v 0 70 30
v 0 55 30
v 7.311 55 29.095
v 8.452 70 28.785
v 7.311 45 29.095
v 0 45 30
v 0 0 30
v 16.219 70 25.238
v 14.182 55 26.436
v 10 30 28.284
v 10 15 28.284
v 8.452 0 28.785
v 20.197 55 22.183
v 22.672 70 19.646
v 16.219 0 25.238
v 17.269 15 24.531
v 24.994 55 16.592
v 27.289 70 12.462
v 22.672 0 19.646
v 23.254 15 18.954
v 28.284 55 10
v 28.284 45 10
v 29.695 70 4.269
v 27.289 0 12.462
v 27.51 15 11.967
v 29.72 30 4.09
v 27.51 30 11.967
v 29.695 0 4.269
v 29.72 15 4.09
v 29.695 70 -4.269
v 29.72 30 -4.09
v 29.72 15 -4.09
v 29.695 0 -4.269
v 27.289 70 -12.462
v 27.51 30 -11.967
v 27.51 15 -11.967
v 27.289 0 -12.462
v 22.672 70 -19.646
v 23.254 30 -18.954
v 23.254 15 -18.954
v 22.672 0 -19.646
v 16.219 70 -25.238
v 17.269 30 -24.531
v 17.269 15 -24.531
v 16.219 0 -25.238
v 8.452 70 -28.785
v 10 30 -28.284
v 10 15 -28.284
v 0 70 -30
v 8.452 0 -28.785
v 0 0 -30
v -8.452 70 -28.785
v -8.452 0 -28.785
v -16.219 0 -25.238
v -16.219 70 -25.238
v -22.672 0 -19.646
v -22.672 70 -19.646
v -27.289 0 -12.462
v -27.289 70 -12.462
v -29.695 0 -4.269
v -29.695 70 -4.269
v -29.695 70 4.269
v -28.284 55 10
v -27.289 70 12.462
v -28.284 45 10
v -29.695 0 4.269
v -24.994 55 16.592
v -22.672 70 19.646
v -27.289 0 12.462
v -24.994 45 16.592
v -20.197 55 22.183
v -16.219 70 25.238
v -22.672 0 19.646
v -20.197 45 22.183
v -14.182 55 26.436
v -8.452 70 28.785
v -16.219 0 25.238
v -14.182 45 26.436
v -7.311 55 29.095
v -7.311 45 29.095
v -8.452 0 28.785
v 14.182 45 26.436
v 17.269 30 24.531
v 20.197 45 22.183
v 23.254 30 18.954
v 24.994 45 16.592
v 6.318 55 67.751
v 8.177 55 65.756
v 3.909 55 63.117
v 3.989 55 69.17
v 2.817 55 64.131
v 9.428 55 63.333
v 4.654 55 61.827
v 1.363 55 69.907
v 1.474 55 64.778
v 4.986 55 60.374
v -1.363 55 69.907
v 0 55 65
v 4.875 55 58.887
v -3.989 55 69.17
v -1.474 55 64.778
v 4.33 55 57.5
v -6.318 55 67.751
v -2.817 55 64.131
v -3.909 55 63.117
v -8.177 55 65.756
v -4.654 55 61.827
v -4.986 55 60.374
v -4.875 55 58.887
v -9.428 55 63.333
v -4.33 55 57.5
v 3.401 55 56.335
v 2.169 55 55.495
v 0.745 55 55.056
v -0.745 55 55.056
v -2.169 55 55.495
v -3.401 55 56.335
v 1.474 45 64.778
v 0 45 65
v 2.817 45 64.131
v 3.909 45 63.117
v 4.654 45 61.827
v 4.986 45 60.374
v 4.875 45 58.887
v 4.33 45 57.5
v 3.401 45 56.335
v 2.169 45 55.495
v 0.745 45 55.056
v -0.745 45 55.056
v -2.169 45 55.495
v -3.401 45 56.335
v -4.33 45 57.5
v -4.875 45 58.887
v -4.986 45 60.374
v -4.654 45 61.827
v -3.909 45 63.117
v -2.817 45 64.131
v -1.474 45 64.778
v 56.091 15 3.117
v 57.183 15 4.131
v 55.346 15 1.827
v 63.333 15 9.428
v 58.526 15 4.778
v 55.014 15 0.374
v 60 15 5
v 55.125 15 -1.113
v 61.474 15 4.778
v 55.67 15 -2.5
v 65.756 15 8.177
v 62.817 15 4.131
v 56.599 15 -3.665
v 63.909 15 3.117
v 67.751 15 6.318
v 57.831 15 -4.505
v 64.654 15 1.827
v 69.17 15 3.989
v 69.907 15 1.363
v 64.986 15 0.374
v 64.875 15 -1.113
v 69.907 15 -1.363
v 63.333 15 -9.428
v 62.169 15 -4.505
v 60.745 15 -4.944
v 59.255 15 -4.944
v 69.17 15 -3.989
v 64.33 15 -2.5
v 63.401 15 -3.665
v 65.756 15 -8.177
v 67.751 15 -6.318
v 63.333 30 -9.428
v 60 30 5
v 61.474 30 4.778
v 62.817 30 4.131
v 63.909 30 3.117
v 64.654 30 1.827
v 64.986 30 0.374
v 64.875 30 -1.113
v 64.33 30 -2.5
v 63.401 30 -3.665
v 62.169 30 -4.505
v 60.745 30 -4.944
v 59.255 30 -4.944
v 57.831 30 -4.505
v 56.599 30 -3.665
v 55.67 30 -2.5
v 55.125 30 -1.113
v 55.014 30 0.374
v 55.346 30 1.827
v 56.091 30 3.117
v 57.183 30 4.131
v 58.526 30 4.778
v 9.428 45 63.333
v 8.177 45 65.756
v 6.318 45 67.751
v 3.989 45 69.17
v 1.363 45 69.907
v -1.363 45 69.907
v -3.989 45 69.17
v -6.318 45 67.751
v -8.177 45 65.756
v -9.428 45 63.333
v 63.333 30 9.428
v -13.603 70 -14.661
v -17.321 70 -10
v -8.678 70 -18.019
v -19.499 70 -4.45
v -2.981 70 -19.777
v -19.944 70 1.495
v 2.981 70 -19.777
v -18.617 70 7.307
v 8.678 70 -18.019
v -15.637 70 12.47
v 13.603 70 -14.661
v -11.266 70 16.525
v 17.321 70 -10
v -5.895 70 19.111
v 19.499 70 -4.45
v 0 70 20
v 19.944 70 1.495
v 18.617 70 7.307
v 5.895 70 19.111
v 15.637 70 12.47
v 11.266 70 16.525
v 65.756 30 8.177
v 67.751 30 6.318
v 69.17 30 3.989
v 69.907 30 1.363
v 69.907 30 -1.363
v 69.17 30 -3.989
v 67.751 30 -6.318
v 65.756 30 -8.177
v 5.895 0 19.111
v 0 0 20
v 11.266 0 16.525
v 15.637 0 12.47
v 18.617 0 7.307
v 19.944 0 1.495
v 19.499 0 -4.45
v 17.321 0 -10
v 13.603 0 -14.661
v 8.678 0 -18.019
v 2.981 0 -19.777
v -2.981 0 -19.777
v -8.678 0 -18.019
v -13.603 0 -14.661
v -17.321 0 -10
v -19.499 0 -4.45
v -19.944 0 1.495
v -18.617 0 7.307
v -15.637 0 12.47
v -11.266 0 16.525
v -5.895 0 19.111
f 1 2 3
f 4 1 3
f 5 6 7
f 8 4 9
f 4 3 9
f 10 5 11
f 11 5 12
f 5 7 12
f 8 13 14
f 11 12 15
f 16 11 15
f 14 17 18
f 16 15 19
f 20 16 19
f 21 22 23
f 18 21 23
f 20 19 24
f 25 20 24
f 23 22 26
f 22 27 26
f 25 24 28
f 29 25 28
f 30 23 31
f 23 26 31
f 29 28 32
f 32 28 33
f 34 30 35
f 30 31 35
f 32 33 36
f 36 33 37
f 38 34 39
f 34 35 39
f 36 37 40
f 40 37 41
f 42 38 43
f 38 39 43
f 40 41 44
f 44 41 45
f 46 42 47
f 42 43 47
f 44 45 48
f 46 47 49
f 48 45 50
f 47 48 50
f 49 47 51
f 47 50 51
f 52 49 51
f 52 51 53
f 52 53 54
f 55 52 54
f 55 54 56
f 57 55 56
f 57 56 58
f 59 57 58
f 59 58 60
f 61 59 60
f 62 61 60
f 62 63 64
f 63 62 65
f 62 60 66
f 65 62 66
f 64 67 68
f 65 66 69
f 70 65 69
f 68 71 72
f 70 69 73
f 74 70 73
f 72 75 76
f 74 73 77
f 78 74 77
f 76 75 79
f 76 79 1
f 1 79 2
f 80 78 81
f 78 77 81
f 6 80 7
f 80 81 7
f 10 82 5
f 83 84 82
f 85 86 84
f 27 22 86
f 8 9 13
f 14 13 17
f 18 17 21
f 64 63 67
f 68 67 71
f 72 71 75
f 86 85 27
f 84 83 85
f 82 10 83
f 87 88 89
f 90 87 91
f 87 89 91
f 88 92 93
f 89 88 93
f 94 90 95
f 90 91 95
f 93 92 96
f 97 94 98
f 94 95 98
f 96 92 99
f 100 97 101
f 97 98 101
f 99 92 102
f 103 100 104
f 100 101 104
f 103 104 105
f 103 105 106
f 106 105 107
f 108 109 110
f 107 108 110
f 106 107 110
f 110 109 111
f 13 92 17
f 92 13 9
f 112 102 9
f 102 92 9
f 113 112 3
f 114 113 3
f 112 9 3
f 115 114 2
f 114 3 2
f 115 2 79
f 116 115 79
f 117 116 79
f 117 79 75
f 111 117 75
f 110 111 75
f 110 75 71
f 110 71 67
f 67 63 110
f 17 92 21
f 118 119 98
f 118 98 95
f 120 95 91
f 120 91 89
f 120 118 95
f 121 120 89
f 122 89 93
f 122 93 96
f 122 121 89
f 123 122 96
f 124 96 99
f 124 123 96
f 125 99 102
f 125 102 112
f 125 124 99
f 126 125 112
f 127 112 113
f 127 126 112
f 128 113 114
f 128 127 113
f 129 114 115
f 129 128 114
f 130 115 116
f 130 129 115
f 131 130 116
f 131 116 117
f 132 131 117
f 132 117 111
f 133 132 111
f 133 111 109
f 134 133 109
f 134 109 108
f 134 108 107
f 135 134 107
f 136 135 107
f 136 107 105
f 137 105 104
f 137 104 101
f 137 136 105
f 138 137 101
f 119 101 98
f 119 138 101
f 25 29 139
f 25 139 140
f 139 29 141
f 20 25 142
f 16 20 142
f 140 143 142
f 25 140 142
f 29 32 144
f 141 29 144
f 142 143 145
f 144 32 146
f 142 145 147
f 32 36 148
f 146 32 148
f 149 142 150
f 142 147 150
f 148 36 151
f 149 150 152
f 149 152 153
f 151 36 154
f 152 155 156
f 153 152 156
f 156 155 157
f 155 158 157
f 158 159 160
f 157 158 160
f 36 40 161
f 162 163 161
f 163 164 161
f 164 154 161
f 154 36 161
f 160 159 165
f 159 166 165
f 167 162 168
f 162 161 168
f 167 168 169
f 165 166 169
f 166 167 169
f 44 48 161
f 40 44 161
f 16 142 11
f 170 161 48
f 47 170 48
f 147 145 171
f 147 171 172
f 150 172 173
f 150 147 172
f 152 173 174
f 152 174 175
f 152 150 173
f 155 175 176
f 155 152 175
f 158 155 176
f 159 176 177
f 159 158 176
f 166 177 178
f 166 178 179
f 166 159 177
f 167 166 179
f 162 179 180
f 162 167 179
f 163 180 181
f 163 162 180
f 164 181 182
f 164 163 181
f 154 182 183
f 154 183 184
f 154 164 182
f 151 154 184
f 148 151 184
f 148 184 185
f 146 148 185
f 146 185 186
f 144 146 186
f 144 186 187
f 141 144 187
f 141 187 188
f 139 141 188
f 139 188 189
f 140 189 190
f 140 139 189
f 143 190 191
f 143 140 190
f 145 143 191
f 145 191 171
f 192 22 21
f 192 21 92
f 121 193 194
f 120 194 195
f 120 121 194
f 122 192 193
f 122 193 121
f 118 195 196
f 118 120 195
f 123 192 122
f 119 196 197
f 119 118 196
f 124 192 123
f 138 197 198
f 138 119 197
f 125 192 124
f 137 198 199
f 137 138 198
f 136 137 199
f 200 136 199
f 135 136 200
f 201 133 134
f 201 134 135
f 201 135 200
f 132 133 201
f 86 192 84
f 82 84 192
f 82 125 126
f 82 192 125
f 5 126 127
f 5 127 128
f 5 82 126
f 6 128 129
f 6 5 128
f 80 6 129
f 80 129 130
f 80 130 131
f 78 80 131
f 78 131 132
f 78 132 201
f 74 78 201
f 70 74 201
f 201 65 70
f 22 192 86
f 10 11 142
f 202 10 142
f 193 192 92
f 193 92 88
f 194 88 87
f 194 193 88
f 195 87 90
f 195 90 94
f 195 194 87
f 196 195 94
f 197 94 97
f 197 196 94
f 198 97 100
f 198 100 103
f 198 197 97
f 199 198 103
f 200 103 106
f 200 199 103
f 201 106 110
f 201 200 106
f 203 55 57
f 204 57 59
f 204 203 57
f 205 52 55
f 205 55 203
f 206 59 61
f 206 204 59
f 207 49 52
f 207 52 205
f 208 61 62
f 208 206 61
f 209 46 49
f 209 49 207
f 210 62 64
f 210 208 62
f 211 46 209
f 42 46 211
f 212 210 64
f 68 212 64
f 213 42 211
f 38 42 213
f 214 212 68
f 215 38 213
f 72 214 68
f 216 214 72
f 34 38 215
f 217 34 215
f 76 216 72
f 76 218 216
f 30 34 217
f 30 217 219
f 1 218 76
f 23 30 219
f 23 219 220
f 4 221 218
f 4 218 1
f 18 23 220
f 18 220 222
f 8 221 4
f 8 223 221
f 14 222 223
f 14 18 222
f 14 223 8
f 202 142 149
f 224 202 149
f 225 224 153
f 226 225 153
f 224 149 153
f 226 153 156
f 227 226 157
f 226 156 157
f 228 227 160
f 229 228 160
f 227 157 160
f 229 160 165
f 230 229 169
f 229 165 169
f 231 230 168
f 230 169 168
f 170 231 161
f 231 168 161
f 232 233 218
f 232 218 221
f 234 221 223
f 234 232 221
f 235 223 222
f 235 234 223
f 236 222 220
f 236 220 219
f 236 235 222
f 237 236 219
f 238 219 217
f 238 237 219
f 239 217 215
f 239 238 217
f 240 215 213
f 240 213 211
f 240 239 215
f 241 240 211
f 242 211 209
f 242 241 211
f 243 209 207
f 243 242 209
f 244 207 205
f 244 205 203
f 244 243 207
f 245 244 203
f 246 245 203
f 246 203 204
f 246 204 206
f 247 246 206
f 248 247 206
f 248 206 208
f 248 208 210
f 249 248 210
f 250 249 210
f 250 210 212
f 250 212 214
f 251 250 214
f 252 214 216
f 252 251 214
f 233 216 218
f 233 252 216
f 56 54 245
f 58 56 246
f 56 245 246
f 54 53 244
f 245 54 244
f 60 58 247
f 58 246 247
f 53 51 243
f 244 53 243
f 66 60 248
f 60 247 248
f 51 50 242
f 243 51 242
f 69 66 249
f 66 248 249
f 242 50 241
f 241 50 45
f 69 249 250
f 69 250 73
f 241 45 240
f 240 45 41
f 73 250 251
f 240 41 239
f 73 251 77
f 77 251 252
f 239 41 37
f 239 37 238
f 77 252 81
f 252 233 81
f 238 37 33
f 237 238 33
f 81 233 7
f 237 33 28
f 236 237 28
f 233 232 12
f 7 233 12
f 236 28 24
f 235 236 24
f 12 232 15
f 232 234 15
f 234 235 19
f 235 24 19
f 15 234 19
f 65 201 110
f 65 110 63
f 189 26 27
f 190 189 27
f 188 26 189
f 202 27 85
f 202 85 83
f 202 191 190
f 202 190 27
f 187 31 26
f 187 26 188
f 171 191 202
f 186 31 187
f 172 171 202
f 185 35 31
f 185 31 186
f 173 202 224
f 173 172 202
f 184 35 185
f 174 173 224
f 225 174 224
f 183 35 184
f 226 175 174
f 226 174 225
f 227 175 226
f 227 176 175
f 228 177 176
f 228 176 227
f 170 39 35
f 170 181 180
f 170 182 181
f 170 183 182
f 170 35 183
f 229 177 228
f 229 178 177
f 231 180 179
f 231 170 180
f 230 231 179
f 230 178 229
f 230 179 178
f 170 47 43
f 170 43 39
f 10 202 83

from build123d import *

# Parameters (mm, degrees)
SKETCH2_R           = 30
SKETCH2_R_2         = 20
BOSS_EXTRUDE1_DEPTH = 70
SKETCH4_R           = 5
BOSS_EXTRUDE2_DEPTH = 15
SKETCH5_R           = 5
BOSS_EXTRUDE3_DEPTH = 10


with BuildPart() as part:
    # Sketch2 → Boss-Extrude1 (new body)
    with BuildSketch(Plane(origin=(0, 0, 0), x_dir=(1, 0, 0), z_dir=(0, 1, 0))):
        with Locations(Location((0, 0, 0), (0, 0, 270))):
            Circle(SKETCH2_R)
        with Locations(Location((0, 0, 0), (0, 0, 270))):
            Circle(SKETCH2_R_2, mode=Mode.SUBTRACT)
    extrude(amount=BOSS_EXTRUDE1_DEPTH)

    # Sketch4 → Boss-Extrude2 (add)
    with BuildSketch(Plane(origin=(0, 15, 0), x_dir=(1, 0, 0), z_dir=(0, 1, 0))):
        with BuildLine():
            Line((63.333333333, 9.428090416), (10, 28.284271247))
            ThreePointArc((10, 28.284271247), (30, 0), (10, -28.284271247))
            Line((10, -28.284271247), (63.333333333, -9.428090416))
            ThreePointArc((63.333333333, -9.428090416), (70, 0), (63.333333333, 9.428090416))
        make_face()
        with Locations(Location((60, 0, 0), (0, 0, 270))):
            Circle(SKETCH4_R, mode=Mode.SUBTRACT)
    extrude(amount=BOSS_EXTRUDE2_DEPTH)

    # Sketch5 → Boss-Extrude3 (add)
    with BuildSketch(Plane(origin=(0, 45, 0), x_dir=(1, 0, 0), z_dir=(0, 1, 0))):
        with BuildLine():
            Line((-9.428090416, -63.333333333), (-28.284271247, -10))
            ThreePointArc((-28.284271247, -10), (0, -30), (28.284271247, -10))
            Line((28.284271247, -10), (9.428090416, -63.333333333))
            ThreePointArc((9.428090416, -63.333333333), (0, -70), (-9.428090416, -63.333333333))
        make_face()
        with Locations(Location((0, -60, 0), (0, 0, 270))):
            Circle(SKETCH5_R, mode=Mode.SUBTRACT)
    extrude(amount=BOSS_EXTRUDE3_DEPTH)


solid = part.part
